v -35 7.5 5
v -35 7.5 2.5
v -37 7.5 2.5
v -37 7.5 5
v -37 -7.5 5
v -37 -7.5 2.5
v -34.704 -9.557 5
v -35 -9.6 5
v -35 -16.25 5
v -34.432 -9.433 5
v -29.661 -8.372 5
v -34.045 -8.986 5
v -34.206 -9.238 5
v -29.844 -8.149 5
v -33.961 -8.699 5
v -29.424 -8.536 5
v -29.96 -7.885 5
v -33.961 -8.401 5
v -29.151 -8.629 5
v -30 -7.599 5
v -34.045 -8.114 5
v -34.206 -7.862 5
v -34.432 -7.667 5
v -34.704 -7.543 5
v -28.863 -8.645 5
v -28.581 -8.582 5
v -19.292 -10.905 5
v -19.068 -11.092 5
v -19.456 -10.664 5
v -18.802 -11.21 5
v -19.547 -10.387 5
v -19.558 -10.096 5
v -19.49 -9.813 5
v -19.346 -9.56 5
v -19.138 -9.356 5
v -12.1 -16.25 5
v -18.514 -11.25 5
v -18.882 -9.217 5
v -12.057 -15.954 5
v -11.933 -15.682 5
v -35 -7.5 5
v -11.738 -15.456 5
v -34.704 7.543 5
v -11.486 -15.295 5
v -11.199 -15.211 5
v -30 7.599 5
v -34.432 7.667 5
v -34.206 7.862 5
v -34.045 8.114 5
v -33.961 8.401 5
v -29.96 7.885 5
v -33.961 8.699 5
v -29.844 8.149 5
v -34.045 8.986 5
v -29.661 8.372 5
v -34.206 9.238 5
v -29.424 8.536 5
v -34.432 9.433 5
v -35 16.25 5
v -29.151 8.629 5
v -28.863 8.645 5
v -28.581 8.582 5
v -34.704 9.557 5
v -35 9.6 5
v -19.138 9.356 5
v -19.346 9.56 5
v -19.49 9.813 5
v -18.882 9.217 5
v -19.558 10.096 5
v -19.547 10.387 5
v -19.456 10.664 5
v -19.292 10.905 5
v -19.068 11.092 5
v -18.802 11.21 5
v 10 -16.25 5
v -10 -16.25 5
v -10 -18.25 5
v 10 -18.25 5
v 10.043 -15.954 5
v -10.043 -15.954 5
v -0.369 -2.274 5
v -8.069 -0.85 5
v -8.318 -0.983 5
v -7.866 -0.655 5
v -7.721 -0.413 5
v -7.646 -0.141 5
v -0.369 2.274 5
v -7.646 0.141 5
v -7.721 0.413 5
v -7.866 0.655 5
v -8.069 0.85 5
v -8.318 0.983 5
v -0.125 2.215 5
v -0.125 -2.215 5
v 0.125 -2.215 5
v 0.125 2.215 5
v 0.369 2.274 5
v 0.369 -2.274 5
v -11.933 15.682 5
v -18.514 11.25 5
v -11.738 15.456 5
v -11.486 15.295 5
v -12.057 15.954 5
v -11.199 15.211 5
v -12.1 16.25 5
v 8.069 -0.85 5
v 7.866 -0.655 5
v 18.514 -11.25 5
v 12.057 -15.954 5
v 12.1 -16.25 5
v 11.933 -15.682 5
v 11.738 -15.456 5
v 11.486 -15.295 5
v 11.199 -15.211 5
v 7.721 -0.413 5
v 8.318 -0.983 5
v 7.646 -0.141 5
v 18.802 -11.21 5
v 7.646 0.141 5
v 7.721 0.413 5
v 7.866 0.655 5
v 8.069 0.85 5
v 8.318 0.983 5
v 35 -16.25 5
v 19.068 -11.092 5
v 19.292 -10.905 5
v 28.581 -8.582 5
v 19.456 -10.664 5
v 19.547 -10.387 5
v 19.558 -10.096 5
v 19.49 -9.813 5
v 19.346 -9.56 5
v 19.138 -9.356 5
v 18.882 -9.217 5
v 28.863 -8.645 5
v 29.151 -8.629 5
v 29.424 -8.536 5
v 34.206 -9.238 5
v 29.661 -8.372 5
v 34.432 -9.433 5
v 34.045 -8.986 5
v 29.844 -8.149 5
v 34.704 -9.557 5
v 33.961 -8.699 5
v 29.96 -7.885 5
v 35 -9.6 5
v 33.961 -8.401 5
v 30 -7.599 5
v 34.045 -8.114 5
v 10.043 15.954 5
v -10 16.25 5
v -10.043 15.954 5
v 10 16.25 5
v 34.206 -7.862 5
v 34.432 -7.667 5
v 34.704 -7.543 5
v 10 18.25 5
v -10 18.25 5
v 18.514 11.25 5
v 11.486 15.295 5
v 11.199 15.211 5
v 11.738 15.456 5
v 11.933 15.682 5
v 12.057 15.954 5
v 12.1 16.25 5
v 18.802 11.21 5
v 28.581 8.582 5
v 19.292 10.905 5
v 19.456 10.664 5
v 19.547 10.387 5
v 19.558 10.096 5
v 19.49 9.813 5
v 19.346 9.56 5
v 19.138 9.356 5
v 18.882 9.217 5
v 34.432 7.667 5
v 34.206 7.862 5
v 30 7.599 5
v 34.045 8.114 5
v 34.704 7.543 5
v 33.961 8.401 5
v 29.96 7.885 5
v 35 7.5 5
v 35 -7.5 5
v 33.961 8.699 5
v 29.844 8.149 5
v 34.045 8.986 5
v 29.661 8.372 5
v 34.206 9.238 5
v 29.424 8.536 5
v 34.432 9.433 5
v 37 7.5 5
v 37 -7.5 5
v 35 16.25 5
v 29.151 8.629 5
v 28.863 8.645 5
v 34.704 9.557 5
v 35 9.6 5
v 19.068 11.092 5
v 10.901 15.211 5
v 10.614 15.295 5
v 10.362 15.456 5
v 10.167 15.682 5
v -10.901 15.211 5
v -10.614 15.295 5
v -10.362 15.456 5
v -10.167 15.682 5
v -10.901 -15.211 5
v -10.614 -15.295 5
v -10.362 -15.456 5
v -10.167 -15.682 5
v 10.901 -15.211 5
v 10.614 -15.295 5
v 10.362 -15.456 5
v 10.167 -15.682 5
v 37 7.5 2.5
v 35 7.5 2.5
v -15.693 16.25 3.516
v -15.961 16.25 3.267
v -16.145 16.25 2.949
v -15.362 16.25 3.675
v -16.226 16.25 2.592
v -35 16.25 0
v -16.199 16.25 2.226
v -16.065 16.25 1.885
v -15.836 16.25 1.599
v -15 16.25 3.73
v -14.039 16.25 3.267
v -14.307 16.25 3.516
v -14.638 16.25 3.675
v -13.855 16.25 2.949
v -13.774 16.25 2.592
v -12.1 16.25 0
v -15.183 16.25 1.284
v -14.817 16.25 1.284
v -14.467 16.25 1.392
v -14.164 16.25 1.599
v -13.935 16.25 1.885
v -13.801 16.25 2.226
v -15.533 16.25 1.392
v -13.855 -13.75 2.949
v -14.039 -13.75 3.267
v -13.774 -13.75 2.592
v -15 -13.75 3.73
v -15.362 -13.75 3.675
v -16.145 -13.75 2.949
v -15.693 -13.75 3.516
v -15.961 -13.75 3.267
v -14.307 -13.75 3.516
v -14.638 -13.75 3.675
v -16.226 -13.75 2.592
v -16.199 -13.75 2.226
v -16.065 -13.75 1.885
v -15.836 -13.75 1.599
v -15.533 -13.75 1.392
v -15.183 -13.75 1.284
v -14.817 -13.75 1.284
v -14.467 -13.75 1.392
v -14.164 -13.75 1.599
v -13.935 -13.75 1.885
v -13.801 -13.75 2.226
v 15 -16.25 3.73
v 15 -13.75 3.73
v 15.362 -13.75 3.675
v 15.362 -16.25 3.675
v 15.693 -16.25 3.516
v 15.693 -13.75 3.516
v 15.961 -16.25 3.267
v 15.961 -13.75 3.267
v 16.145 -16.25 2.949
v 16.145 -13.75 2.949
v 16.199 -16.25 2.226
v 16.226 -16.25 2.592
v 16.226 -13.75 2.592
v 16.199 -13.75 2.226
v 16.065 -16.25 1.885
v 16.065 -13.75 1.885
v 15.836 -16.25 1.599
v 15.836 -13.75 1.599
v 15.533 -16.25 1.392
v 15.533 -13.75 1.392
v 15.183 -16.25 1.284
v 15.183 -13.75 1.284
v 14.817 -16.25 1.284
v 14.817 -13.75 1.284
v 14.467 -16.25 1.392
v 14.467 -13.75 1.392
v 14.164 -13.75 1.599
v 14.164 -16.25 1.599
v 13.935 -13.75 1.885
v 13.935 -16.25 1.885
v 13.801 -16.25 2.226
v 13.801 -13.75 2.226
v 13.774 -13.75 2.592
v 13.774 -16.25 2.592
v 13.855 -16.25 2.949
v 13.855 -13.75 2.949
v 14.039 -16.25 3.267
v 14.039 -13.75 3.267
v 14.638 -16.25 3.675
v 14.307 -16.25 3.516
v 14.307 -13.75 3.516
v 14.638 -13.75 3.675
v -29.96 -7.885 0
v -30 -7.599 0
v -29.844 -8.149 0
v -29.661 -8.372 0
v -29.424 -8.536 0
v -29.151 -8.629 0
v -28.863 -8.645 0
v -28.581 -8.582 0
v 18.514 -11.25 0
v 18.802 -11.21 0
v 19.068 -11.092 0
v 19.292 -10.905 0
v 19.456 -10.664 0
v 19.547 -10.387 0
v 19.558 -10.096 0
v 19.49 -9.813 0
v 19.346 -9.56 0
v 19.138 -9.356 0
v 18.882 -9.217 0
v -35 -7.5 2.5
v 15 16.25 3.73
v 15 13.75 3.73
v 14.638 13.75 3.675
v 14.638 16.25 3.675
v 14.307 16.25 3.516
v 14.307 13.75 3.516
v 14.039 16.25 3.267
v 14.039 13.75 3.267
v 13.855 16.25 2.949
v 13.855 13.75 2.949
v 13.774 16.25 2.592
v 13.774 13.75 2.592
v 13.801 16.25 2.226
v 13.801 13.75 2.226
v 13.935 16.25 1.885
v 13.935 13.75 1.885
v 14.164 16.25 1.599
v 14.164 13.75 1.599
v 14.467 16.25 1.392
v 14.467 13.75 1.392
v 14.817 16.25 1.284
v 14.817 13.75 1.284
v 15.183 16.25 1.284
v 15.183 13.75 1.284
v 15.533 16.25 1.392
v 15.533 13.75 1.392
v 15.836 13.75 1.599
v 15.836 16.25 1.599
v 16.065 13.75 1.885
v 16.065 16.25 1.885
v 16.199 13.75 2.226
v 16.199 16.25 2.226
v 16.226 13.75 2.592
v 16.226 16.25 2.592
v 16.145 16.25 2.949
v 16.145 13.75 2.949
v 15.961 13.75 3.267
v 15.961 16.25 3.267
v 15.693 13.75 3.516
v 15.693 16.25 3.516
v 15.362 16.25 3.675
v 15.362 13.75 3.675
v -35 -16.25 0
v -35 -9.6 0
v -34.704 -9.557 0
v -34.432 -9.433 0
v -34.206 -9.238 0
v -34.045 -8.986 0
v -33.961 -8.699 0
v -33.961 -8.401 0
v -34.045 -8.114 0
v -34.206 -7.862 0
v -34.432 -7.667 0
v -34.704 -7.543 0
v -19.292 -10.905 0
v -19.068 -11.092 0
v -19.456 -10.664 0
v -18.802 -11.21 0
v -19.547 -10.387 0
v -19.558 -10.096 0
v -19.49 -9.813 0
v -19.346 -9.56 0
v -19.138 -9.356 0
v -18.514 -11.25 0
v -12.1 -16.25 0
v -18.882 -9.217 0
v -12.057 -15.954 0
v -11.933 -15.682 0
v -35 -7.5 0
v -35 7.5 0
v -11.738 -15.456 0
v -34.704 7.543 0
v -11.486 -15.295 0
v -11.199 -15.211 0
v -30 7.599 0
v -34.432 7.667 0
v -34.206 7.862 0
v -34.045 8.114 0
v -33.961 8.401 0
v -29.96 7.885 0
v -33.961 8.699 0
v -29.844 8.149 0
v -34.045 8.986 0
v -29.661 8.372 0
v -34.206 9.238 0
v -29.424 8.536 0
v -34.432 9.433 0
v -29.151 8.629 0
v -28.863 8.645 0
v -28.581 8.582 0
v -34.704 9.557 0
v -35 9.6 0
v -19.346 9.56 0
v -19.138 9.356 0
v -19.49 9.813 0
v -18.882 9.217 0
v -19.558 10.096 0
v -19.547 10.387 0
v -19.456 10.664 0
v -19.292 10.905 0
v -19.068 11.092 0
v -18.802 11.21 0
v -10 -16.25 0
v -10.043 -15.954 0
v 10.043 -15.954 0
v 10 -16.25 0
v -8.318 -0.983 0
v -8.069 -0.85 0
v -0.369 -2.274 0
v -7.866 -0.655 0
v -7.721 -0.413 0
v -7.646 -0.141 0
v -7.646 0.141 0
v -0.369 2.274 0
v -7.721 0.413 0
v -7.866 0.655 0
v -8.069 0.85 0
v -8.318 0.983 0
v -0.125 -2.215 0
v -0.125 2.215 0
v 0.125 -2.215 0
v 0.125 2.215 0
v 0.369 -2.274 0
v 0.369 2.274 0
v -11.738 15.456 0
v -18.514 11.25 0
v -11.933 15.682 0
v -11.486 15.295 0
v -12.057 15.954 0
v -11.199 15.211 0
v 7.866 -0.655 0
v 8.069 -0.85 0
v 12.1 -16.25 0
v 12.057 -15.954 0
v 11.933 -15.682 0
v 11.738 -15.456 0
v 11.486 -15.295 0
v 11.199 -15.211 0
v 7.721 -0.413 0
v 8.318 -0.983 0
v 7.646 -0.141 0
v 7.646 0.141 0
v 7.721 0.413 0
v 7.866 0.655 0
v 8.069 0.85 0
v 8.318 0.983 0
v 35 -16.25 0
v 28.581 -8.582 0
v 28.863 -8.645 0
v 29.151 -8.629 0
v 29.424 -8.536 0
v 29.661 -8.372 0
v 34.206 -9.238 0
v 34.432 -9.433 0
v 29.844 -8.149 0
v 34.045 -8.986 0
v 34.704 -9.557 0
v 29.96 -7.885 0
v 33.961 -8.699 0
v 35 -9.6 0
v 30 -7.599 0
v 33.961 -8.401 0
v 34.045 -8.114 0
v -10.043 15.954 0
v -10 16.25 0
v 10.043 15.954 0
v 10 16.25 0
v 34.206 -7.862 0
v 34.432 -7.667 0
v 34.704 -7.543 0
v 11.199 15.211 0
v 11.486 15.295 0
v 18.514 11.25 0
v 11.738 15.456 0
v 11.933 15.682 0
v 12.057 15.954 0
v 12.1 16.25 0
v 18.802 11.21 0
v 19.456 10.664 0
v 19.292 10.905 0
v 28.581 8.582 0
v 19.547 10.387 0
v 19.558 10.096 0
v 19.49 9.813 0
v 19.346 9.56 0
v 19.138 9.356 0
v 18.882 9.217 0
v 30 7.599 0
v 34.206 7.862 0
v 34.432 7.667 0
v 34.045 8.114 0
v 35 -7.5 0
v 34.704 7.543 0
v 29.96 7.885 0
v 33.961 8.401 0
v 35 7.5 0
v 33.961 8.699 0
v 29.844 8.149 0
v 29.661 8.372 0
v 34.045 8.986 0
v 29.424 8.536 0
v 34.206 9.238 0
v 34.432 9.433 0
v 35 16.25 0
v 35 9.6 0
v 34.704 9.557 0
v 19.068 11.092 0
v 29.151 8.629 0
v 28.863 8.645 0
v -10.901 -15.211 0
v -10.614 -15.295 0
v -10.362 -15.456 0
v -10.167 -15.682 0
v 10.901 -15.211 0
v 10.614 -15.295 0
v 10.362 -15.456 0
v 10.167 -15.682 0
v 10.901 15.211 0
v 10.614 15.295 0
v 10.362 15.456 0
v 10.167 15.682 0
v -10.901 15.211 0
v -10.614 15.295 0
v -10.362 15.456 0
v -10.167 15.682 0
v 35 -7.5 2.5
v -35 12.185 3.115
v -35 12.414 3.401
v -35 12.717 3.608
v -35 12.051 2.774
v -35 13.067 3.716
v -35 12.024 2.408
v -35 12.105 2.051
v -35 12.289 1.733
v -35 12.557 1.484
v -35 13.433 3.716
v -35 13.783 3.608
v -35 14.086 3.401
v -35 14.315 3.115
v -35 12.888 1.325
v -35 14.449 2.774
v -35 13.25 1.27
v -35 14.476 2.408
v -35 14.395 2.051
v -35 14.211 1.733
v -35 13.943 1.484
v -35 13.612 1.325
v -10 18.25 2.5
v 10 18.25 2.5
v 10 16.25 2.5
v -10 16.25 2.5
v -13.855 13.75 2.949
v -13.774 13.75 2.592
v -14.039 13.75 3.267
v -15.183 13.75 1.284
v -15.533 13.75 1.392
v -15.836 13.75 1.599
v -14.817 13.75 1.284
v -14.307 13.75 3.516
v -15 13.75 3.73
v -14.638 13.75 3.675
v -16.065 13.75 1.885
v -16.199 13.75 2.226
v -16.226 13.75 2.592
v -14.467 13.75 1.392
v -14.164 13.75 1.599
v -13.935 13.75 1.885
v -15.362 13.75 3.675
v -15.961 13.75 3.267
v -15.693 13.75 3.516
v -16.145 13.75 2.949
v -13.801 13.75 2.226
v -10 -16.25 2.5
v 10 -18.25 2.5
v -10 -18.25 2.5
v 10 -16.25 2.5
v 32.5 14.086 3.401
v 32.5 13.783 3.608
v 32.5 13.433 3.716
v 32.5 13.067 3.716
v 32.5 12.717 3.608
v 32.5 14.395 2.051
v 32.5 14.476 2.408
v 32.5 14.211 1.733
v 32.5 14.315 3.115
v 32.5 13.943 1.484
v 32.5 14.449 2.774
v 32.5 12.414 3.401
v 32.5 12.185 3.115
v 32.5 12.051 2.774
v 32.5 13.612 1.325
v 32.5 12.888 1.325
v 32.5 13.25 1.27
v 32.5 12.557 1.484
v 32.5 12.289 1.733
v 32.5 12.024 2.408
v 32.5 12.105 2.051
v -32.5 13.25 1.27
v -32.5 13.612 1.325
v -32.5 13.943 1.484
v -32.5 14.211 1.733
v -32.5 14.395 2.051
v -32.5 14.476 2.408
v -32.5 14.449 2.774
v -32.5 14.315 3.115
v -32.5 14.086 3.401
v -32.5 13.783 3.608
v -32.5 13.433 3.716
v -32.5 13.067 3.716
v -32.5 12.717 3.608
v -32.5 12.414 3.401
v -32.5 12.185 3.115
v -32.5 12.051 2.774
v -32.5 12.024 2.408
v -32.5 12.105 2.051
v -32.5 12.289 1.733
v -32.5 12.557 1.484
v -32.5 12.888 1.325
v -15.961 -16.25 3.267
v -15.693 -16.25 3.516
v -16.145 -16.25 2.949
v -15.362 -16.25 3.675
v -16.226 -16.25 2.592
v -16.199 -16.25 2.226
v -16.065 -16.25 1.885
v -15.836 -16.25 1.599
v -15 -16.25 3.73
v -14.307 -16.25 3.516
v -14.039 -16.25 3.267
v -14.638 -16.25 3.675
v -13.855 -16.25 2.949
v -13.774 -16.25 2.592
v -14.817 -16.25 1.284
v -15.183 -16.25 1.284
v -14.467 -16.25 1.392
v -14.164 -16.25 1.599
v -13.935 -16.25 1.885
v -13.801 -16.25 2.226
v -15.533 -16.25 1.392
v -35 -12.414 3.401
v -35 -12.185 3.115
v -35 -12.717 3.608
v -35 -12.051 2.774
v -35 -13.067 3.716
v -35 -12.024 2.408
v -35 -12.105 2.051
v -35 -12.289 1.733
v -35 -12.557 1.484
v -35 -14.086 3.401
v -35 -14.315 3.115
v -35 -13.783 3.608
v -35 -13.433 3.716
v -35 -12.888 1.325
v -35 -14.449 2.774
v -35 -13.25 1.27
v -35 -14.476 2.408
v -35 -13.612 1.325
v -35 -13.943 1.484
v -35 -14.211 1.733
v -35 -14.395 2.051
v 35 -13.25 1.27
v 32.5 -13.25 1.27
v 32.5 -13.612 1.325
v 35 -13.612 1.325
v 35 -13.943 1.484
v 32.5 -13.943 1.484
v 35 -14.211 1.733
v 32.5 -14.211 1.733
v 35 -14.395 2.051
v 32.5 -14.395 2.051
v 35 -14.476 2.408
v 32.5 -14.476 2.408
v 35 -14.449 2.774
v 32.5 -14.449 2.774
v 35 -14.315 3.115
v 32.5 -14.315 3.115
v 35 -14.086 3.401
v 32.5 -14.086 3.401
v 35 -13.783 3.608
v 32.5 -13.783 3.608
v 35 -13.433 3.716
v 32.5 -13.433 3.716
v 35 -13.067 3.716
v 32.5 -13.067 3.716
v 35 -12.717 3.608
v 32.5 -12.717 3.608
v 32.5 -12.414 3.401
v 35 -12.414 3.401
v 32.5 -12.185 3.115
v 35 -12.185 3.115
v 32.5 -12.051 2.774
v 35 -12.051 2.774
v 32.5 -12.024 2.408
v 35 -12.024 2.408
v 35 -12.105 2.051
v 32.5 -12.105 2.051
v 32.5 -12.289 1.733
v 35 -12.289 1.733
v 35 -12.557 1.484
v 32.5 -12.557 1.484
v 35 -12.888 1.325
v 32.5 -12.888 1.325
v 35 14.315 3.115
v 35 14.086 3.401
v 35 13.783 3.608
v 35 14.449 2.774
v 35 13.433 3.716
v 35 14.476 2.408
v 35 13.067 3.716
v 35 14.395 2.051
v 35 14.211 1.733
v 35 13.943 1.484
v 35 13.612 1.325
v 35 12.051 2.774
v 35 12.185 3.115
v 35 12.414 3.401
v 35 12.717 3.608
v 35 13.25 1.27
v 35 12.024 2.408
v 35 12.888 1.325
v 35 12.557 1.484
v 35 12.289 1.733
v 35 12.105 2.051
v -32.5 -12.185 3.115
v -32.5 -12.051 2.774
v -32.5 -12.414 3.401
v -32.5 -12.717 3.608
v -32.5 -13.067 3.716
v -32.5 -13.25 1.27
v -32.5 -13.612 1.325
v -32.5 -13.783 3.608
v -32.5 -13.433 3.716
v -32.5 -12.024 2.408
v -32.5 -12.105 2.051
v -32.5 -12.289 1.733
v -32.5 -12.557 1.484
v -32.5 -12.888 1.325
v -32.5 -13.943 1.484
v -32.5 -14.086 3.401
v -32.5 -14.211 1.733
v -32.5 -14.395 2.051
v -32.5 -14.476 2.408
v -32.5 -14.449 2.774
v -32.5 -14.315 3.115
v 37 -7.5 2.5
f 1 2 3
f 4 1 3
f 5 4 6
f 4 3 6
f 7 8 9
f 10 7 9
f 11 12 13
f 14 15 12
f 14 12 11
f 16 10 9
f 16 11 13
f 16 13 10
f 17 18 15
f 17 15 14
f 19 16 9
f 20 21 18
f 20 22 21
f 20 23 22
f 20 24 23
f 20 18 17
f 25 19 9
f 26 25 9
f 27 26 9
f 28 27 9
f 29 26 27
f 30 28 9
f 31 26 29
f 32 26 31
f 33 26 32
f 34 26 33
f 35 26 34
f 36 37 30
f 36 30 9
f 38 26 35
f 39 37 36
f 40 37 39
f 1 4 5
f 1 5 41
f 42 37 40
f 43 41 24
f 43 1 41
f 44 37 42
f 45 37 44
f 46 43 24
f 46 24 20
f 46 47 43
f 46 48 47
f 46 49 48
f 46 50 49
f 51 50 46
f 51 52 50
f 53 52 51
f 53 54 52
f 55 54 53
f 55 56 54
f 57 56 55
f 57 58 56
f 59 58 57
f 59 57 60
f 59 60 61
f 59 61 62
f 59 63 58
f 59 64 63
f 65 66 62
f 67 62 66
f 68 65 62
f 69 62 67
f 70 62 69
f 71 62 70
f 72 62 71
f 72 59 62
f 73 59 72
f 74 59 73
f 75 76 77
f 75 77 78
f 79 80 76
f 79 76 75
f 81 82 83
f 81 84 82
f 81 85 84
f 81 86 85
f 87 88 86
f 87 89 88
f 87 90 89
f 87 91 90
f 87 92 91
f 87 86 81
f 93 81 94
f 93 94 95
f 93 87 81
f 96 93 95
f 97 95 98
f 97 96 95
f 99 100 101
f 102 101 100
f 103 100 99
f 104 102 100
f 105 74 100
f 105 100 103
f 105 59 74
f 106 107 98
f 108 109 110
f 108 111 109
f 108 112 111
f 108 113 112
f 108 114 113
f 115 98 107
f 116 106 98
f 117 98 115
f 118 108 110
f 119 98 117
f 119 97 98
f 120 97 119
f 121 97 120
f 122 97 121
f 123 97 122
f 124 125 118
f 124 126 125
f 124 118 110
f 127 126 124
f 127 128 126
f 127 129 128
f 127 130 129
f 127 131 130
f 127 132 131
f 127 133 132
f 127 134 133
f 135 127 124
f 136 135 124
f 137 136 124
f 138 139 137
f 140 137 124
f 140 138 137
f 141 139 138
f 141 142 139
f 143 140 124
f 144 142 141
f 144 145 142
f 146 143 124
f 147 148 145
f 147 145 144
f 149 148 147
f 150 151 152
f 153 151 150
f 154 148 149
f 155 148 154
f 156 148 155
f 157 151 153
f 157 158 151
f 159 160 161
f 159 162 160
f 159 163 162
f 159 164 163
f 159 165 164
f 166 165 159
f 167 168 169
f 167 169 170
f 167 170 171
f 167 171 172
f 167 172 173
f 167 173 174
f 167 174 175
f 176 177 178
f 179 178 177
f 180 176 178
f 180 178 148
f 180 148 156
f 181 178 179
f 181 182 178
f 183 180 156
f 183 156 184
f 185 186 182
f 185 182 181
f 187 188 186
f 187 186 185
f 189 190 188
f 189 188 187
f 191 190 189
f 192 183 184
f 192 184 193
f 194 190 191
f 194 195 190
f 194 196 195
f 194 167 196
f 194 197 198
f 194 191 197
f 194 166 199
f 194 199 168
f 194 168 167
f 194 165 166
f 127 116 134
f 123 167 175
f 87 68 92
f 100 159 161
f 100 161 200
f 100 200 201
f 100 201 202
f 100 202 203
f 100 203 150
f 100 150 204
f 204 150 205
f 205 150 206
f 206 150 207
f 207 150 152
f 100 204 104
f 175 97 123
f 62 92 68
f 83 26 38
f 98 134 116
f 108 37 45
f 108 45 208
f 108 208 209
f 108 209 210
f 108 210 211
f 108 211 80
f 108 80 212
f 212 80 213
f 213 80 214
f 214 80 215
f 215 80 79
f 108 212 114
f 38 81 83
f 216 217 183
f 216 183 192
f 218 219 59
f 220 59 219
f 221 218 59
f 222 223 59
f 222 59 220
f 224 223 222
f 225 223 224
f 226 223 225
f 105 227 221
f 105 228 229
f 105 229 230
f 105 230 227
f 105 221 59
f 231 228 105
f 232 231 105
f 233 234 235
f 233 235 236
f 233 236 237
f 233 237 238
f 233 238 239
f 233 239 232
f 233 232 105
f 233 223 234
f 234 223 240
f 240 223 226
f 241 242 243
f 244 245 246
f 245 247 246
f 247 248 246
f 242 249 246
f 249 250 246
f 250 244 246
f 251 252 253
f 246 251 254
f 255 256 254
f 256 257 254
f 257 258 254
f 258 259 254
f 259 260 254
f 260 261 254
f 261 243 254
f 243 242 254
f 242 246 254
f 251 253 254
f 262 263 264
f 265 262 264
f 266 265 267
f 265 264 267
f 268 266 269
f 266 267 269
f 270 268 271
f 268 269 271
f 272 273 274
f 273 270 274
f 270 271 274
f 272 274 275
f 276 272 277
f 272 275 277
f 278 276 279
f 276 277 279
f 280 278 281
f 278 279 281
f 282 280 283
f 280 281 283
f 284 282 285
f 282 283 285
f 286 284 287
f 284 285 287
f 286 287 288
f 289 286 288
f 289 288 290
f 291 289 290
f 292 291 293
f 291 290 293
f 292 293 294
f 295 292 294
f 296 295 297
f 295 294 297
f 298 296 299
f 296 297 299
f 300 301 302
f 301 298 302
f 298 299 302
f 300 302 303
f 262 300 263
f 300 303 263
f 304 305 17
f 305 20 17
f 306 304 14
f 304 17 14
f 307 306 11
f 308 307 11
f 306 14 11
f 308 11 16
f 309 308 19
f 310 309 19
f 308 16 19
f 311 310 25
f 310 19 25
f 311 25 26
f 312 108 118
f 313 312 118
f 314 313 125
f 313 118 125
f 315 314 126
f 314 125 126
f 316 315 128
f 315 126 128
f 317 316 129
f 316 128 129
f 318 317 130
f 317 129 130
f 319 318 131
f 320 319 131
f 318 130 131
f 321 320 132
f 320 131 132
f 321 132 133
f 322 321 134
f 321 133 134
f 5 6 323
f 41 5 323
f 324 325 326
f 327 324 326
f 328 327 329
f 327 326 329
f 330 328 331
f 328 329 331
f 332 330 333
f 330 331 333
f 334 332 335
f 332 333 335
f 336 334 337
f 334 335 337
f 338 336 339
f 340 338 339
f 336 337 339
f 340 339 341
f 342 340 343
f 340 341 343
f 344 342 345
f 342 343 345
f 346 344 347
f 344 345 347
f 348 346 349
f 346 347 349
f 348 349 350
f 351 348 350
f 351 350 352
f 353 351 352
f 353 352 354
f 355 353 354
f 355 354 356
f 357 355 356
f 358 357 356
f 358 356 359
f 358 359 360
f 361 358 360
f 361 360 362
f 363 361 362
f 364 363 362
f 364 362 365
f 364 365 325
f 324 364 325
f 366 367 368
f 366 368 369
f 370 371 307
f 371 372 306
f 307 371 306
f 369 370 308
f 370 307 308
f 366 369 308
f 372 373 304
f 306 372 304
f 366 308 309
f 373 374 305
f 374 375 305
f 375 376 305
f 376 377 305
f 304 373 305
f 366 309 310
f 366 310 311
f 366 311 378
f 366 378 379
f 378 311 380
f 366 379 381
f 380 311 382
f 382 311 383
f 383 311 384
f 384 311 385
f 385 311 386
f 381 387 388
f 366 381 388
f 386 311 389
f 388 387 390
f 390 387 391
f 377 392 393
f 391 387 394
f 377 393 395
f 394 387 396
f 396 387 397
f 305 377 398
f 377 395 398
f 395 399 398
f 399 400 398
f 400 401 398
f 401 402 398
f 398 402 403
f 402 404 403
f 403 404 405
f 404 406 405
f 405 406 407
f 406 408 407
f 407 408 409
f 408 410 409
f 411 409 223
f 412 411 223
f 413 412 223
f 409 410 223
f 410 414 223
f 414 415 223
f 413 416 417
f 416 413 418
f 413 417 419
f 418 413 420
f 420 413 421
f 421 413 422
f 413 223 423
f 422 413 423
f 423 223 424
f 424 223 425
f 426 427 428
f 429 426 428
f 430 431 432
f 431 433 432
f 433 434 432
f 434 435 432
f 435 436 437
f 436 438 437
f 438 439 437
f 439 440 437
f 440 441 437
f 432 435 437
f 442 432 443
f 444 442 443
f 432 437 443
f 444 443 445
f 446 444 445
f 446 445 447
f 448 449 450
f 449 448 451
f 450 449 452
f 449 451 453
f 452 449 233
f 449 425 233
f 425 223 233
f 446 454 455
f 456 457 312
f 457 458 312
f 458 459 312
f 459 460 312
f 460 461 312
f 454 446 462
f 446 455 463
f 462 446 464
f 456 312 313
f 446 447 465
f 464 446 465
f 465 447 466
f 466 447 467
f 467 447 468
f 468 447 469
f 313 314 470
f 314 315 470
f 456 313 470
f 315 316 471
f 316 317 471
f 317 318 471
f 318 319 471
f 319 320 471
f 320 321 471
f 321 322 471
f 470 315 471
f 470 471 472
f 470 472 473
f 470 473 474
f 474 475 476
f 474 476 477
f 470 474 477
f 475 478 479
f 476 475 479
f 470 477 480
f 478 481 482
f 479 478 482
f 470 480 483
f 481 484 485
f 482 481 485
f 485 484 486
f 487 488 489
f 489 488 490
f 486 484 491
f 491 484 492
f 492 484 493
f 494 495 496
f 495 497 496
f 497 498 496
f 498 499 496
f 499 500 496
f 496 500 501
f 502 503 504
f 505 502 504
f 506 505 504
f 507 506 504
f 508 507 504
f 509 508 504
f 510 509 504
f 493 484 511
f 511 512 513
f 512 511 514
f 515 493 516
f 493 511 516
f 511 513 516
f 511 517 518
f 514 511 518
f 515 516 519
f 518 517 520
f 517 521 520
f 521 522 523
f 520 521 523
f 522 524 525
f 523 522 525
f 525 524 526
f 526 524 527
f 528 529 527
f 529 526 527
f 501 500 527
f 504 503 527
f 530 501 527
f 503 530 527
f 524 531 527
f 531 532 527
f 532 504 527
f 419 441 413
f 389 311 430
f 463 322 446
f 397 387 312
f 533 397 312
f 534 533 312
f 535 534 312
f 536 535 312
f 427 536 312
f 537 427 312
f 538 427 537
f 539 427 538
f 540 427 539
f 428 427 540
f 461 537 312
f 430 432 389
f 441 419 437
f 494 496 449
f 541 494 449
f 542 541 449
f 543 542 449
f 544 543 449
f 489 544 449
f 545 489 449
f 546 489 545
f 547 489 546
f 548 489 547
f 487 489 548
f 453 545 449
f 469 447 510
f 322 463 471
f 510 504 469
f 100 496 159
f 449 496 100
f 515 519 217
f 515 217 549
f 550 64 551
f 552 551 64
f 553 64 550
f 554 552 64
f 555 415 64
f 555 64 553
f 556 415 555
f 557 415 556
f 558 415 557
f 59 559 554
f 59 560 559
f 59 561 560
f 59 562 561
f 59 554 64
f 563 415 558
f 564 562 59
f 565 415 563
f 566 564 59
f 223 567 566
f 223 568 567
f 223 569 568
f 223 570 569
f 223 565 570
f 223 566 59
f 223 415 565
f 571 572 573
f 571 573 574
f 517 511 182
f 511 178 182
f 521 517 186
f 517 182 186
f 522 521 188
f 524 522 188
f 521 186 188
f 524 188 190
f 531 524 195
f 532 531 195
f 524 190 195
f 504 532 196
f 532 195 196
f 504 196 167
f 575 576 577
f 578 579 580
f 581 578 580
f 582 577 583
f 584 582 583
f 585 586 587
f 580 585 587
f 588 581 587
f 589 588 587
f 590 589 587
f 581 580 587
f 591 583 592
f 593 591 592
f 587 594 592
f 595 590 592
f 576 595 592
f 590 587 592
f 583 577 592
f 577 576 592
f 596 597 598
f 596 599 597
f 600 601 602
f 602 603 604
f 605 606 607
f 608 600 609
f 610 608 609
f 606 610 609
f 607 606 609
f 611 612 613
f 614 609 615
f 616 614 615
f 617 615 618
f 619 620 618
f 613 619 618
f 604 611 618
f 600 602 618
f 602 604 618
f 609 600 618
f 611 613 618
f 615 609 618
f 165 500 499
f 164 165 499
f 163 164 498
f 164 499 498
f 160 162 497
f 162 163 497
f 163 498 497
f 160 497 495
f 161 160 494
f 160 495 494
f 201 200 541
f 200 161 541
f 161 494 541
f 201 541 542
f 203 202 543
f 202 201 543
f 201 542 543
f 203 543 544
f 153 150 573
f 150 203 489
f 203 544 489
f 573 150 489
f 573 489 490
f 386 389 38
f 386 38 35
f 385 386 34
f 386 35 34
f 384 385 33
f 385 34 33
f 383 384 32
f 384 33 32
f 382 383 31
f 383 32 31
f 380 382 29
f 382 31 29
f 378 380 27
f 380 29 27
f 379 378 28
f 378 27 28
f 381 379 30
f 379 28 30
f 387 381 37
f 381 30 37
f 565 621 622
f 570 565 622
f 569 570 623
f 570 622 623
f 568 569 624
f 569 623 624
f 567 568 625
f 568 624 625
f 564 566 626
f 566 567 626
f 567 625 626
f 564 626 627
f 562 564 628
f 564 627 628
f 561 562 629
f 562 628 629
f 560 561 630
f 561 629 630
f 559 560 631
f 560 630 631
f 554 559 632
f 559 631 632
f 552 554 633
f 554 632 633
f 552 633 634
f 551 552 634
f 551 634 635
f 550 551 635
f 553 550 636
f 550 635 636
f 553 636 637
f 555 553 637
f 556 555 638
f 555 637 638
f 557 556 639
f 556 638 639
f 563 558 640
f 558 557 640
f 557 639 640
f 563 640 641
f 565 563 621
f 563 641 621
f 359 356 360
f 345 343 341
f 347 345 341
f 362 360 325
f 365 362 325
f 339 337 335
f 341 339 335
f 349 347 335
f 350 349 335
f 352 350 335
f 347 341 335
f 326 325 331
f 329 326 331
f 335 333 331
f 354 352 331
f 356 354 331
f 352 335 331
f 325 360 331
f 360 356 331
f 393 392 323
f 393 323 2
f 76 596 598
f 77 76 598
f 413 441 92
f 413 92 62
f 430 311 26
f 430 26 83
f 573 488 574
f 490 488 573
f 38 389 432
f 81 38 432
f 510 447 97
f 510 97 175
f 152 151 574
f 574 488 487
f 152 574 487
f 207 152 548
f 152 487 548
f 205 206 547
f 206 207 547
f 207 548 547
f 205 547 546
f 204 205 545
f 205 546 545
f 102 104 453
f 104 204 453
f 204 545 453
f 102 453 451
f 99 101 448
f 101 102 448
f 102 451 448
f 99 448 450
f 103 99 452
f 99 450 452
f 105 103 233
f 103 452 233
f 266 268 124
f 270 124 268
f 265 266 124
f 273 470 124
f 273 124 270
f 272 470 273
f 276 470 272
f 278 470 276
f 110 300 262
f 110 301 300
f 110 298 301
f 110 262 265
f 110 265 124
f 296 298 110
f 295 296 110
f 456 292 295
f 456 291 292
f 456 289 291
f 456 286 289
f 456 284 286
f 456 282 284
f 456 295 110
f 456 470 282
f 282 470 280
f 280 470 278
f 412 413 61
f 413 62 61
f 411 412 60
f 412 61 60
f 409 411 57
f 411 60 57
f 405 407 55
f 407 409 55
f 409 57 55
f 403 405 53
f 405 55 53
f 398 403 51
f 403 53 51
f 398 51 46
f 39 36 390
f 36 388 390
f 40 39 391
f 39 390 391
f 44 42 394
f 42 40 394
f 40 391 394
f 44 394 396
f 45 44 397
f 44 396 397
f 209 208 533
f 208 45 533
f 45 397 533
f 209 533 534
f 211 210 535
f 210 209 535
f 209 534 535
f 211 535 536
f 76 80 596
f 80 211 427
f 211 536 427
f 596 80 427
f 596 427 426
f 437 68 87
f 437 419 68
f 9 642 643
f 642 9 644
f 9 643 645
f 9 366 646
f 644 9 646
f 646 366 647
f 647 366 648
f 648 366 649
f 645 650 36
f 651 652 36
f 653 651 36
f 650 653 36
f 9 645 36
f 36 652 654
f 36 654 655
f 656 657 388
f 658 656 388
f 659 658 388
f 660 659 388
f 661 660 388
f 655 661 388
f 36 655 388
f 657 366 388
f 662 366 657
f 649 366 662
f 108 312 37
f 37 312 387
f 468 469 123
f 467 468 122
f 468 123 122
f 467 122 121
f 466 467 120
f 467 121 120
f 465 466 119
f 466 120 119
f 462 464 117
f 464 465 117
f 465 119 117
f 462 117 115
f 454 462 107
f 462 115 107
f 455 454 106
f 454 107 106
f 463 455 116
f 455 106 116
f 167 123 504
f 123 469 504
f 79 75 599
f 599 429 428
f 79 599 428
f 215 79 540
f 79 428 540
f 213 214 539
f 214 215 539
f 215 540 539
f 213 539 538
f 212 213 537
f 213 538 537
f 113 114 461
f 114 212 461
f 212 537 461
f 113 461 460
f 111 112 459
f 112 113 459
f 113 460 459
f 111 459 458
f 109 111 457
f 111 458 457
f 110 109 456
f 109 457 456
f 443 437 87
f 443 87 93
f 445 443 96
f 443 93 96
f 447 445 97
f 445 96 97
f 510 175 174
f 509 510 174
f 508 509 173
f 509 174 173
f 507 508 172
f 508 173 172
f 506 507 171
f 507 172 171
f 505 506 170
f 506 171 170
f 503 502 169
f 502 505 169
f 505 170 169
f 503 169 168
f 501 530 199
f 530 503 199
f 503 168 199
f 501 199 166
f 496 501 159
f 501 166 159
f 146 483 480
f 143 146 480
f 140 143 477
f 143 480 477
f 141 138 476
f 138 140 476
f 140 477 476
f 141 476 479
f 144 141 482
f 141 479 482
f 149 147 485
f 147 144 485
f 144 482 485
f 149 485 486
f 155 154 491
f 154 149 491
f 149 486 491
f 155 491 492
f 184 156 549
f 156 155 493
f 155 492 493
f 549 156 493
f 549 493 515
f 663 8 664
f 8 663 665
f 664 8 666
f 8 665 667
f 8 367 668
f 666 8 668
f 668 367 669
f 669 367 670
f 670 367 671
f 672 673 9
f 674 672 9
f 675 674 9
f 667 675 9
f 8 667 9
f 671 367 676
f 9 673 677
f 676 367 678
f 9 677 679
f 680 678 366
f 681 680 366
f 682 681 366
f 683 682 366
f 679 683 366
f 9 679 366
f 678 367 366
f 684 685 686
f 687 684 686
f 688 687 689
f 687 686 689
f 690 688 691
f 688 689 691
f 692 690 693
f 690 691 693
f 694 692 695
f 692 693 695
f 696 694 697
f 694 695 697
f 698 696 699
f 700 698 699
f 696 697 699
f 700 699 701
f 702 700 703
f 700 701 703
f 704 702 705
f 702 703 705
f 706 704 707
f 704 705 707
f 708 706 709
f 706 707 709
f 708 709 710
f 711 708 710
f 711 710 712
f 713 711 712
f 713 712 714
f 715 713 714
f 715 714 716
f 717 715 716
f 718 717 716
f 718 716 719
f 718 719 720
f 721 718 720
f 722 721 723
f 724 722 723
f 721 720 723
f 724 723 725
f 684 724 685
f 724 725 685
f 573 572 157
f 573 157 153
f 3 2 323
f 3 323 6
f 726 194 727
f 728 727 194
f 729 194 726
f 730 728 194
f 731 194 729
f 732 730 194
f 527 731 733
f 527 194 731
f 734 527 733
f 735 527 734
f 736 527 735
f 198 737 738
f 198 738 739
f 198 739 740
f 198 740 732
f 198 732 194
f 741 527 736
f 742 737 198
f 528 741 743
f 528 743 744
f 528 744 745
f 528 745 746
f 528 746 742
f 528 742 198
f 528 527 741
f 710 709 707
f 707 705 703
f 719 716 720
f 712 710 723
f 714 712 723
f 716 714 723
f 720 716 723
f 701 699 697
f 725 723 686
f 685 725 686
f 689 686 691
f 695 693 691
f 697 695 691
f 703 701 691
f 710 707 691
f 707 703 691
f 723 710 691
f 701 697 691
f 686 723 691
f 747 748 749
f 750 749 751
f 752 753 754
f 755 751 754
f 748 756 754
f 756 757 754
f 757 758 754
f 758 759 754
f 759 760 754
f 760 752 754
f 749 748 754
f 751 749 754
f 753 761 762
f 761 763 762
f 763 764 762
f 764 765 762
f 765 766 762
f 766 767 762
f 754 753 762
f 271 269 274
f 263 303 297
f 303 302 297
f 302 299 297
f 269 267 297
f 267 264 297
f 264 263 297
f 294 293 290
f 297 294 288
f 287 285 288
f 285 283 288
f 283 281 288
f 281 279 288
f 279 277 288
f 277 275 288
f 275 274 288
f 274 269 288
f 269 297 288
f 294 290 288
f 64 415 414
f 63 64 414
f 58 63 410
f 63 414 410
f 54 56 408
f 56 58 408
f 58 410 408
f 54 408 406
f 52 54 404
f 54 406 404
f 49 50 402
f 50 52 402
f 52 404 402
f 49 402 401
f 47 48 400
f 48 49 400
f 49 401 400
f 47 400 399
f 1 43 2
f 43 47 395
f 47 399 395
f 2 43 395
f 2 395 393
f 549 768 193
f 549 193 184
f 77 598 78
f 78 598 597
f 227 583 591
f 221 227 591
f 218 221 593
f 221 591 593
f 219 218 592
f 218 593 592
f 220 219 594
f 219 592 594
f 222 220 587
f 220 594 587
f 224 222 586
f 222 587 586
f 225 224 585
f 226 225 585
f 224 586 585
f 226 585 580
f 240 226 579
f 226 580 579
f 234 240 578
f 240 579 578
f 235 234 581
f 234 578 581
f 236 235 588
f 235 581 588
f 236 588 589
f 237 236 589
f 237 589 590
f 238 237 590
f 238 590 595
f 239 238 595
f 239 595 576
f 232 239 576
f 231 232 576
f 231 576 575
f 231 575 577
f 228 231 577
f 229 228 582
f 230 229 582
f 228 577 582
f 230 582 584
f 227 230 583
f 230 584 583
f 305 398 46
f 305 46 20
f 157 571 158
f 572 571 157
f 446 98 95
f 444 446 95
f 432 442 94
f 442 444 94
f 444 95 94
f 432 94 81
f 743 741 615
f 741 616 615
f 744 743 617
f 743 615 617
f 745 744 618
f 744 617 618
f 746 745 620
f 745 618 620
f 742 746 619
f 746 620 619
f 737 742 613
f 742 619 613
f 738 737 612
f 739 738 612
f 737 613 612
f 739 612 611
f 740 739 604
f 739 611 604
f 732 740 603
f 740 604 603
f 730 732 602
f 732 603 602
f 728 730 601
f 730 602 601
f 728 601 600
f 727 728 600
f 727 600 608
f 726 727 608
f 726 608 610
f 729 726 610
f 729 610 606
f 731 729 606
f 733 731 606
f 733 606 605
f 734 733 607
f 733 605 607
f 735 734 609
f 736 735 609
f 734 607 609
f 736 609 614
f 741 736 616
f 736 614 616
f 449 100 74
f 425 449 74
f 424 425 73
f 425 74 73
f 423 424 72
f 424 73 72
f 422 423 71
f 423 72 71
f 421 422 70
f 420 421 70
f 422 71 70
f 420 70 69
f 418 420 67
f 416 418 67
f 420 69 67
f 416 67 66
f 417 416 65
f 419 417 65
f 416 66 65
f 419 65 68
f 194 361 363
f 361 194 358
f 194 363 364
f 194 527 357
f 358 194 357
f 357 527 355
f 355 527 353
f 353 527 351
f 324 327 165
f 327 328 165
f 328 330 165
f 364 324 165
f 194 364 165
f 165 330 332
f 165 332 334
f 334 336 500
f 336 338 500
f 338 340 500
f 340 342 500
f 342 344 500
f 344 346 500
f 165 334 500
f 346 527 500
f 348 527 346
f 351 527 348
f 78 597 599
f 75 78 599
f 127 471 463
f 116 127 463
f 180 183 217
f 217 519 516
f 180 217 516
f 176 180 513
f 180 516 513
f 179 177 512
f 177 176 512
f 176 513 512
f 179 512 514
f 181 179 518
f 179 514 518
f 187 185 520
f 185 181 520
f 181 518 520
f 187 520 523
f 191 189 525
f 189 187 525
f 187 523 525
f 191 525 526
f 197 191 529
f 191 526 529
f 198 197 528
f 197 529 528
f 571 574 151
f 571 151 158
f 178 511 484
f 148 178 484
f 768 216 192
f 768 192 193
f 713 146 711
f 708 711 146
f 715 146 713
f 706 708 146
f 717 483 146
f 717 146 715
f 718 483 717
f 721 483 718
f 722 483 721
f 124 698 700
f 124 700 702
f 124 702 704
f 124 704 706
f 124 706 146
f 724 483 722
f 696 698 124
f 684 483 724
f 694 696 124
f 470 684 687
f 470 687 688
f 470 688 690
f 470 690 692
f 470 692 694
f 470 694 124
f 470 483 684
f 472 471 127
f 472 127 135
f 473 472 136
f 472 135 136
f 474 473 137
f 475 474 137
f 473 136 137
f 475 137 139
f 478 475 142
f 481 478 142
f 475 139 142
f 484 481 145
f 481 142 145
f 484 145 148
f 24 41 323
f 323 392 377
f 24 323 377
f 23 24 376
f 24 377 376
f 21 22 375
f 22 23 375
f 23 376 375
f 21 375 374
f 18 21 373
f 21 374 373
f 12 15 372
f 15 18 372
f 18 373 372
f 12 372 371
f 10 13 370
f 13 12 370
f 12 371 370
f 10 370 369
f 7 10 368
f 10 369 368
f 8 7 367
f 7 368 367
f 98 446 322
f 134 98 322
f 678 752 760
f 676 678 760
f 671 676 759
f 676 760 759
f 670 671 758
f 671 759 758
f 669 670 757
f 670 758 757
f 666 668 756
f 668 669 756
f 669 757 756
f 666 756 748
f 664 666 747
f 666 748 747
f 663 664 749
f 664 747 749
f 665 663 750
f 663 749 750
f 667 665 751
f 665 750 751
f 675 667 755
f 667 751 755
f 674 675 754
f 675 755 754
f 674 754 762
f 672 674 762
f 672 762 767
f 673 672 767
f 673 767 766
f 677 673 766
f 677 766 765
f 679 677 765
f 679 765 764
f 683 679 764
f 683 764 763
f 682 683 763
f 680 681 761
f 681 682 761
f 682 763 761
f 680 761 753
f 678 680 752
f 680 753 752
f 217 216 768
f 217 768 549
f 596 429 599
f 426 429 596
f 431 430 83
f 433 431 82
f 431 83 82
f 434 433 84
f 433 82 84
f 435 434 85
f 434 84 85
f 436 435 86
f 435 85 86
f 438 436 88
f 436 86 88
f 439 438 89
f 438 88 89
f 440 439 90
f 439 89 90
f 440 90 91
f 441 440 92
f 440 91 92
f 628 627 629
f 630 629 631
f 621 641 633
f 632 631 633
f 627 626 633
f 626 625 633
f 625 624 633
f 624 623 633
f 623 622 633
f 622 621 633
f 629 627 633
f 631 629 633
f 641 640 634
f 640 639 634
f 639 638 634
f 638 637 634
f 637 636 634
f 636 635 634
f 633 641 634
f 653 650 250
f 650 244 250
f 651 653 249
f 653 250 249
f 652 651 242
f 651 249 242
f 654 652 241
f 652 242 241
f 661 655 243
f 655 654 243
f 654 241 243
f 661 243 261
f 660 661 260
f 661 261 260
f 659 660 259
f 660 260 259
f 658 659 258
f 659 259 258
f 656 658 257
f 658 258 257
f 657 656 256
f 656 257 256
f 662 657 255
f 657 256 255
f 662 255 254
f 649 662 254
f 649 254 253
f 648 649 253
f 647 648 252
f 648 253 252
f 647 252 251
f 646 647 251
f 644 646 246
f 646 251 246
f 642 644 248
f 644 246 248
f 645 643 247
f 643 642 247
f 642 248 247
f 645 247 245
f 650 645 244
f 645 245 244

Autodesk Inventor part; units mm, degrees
ref_plane "YZ Plane" through (0, 0, 0) normal (1, 0, 0) x (0, 1, 0)
ref_plane "XZ Plane" through (0, 0, 0) normal (0, 1, 0) x (-1, 0, 0)
ref_plane "XY Plane" through (0, 0, 0) normal (0, 0, 1) x (1, 0, 0)
sketch "スケッチ1" plane through (0, 0, 0) normal (0, 0, 1) x (1, 0, 0)
  line L0 (-35, 9.6) -> (-35, 16.25)
  line L1 (-35, 16.25) -> (-20, 16.25)
  line L2 (20, 16.25) -> (35, 16.25)
  line L3 (35, 16.25) -> (35, 9.6)
  line L4 (0, 0) -> (0, 16.25) construction
  line L5 (0, 0) -> (37, 0) construction
  line L6 (35, 7.5) -> (37, 7.5)
  line L7 (37, 7.5) -> (37, -7.5)
  line L8 (37, -7.5) -> (35, -7.5)
  line L9 (-20, -16.25) -> (20, -16.25) construction
  line L10 (20, -16.25) -> (20, 16.25) construction
  line L11 (20, 16.25) -> (-20, 16.25) construction
  line L12 (-20, 16.25) -> (-20, -16.25) construction
  line L13 (-20, -16.25) -> (20, 16.25) construction
  line L14 (20, -16.25) -> (-20, 16.25) construction
  line L15 (-35, -16.25) -> (35, -16.25) construction
  line L16 (35, -16.25) -> (35, 16.25) construction
  line L17 (35, 16.25) -> (-35, 16.25) construction
  line L18 (-35, 16.25) -> (-35, -16.25) construction
  line L19 (-35, -16.25) -> (35, 16.25) construction
  line L20 (35, -16.25) -> (-35, 16.25) construction
  arc A0 (35, 9.6) -> (35, 7.5) centre (35, 8.55) ccw
  arc A1 (35, -7.5) -> (35, -9.6) centre (35, -8.55) ccw
  line L21 (35, -9.6) -> (35, -16.25)
  line L22 (35, -16.25) -> (20, -16.25)
  line L23 (20, -16.25) -> (12.1, -16.25)
  line L24 (-20, 16.25) -> (-12.1, 16.25)
  line L25 (-10, 16.25) -> (-10, 18.25)
  line L26 (-10, 18.25) -> (10, 18.25)
  line L27 (10, 18.25) -> (10, 16.25)
  line L28 (20, 16.25) -> (12.1, 16.25)
  arc A2 (-12.1, 16.25) -> (-10, 16.25) centre (-11.05, 16.25) ccw
  arc A3 (10, 16.25) -> (12.1, 16.25) centre (11.05, 16.25) ccw
  line L29 (-35, 7.5) -> (-37, 7.5)
  line L30 (-37, 7.5) -> (-37, -7.5)
  line L31 (-37, -7.5) -> (-35, -7.5)
  arc A4 (-35, 7.5) -> (-35, 9.6) centre (-35, 8.55) ccw
  arc A5 (-35, -9.6) -> (-35, -7.5) centre (-35, -8.55) ccw
  line L32 (-35, -9.6) -> (-35, -16.25)
  line L33 (-35, -16.25) -> (-20, -16.25)
  line L34 (-20, -16.25) -> (-12.1, -16.25)
  line L35 (-10, -16.25) -> (-10, -18.25)
  line L36 (-10, -18.25) -> (10, -18.25)
  line L37 (10, -18.25) -> (10, -16.25)
  arc A6 (-10, -16.25) -> (-12.1, -16.25) centre (-11.05, -16.25) ccw
  arc A7 (12.1, -16.25) -> (10, -16.25) centre (11.05, -16.25) ccw
  line L38 (-16.55, 19.1799) -> (-13.45, 19.1799) construction
  line L39 (-13.45, 19.1799) -> (-13.45, 12.4242) construction
  line L40 (-13.45, 12.4242) -> (-16.55, 12.4242) construction
  line L41 (-16.55, 12.4242) -> (-16.55, 19.1799) construction
  line L42 (-15, 19.1799) -> (-15, 12.4242) construction
  point P0 (0, 18.25)
  point P1 (0, 0)
  dimension "d0" = 1.05
  dimension "d1" = 32.5
  dimension "d2" = 70
  dimension "d3" = 40
  dimension "d23" = 2
  dimension "d30" = 2
  dimension "d34" = 8.75
  dimension "d53" = 20
  dimension "d54" = 3.1
  dimension "d55" = 5
  dimension "d85" = 32.5
extrude "押し出し1" add sketch "スケッチ1" along normal blind 5
sketch "スケッチ2" plane through (0, 0, 0) normal (0, 0, -1) x (-1, 0, 0)
  line L0 (35, 9.6) -> (35, 16.25) projected
  line L1 (-35, 16.25) -> (-35, 9.6) projected
  line L2 (-43.1427, 17.3125) -> (-35, 17.3125)
  line L3 (-35, 17.3125) -> (-35, -16.751)
  line L4 (-35, -16.751) -> (-43.1427, -16.751)
  line L5 (-43.1427, -16.751) -> (-43.1427, 17.3125)
  line L6 (35, 21.1805) -> (40.858, 21.1805)
  line L7 (40.858, 21.1805) -> (40.858, -13.6193)
  line L8 (40.858, -13.6193) -> (35, -13.6193)
  line L9 (35, -13.6193) -> (35, 21.1805)
  line L10 (-20, -16.25) -> (-12.1, -16.25)
  line L11 (-17.1371, 25.1848) -> (11.8342, 25.1848)
  line L12 (11.8342, 25.1848) -> (11.8342, 16.25)
  line L13 (11.8342, 16.25) -> (-17.1371, 16.25)
  line L14 (-17.1371, 16.25) -> (-17.1371, 25.1848)
  line L15 (-13.151, -21.5857) -> (17.7795, -21.5857)
  line L16 (17.7795, -21.5857) -> (17.7795, -16.25)
  line L17 (17.7795, -16.25) -> (-13.151, -16.25)
  line L18 (-13.151, -16.25) -> (-13.151, -21.5857)
  line L19 (-12.1, 16.25) -> (-35, 16.25)
  line L20 (-35, -16.25) -> (-12.1, -16.25)
  point P0 (0, 0)
extrude "押し出し2" cut sketch "スケッチ2" against normal blind 2.5
sketch "スケッチ3" plane through (12.1, 16.25, 0) normal (0, 1, 0) x (1, 0, 0)
  line L0 (-2.1, 0) -> (-2.1, -5) projected
  line L1 (-2.1, -5) -> (-22.1, -5) construction
  line L2 (-12.1, -5) -> (-12.1, 7.4607) construction
  line L3 (22.9, 0) -> (22.9, -5) projected
  point P0 (-12.1, 0)
  point P1 (2.9, -2.5)
  point P2 (-27.1, -2.5)
  point P3 (22.9, -2.5)
  dimension "d60" = 5
hole "穴1" at (15, 16.25, 2.5) at (-15, 16.25, 2.5) direction (0, -1, 0) diameter 2.459 depth 2.5 thread size "M3x0.5" class "6H" standard "ISO Metric profile"
mirror "ミラー1" about plane through (0, 0, 0) normal (0, 1, 0) of "穴1"
sketch "スケッチ4" plane through (35, -16.25, 5) normal (1, 0, 0) x (0, 0, -1)
  line L0 (5, 16.25) -> (0, 16.25) construction
  line L1 (0, 23.75) -> (0, 8.75) construction
  line L2 (5, 6.65) -> (0, 6.65) projected
  line L3 (5, 0) -> (0, 0) projected
  point P0 (2.5, 3)
  point P1 (2.5, 29.5)
  point P2 (2.5, 6.65)
  dimension "d86" = 3
  dimension "d87" = 26.5
hole "穴2" at (35, -13.25, 2.5) at (35, 13.25, 2.5) direction (-1, 0, 0) diameter 2.459 depth 2.5 thread size "M3x0.5" class "6H" standard "ISO Metric profile"
mirror "ミラー2" about plane through (0, 0, 0) normal (1, 0, 0) of "穴2"
sketch "スケッチ5" plane through (0, 0, 0) normal (0, 0, -1) x (-1, 0, 0)
  line L0 (10, 16.25) -> (-10, 16.25) projected
  line L1 (-35, 7.5) -> (-35, 9.6) projected
  line L2 (-30, -11.25) -> (30, -11.25) construction
  line L3 (30, -11.25) -> (30, 11.25) construction
  line L4 (30, 11.25) -> (-30, 11.25) construction
  line L5 (-30, 11.25) -> (-30, -11.25) construction
  line L6 (-30, -11.25) -> (30, 11.25) construction
  line L7 (30, -11.25) -> (-30, 11.25) construction
  line L8 (-30, 9.114) -> (-30, -9.114)
  line L9 (-30, -9.114) -> (-5.696, 0)
  line L10 (-5.696, 0) -> (-30, 9.114)
  line L11 (-24.304, 11.25) -> (24.304, 11.25)
  line L12 (24.304, 11.25) -> (0, 2.136)
  line L13 (0, 2.136) -> (-24.304, 11.25)
  line L14 (-24.304, -11.25) -> (24.304, -11.25)
  line L15 (24.304, -11.25) -> (0, -2.136)
  line L16 (0, -2.136) -> (-24.304, -11.25)
  line L17 (30, 9.114) -> (30, -9.114)
  line L18 (30, -9.114) -> (5.696, 0)
  line L19 (5.696, 0) -> (30, 9.114)
  point P0 (-12.1, 16.25)
  point P1 (-20, 16.25)
  point P2 (-35, 16.25)
  point P3 (0, 0)
  dimension "d76" = 5
  dimension "d77" = 5
  dimension "d78" = 4
  dimension "d79" = 4
  dimension "d80" = 4
  dimension "d81" = 4
extrude "押し出し3" cut sketch "スケッチ5" against normal blind 10
fillet "フィレット1" radius 1.05 12 edges at (30, 9.114, 2.5) (30, -9.114, 2.5) (24.304, 11.25, 2.5) (5.696, 0, 2.5) (0, -2.136, 2.5) (0, 2.136, 2.5) (-30, -9.114, 2.5) (24.304, -11.25, 2.5) (-30, 9.114, 2.5) (-24.304, 11.25, 2.5) (-24.304, -11.25, 2.5) (-5.696, 0, 2.5)
equation "\"d85\" = d1"
equation "\"d60\" = d55"
equation "\"d77\" = d76"
equation "\"d79\" = d78"
equation "\"d80\" = d79"
equation "\"d81\" = d78"
equation "\"d52\" = 5"
properties part number "胴体_メインフレーム_1_13" material "アセタール樹脂、黒"
